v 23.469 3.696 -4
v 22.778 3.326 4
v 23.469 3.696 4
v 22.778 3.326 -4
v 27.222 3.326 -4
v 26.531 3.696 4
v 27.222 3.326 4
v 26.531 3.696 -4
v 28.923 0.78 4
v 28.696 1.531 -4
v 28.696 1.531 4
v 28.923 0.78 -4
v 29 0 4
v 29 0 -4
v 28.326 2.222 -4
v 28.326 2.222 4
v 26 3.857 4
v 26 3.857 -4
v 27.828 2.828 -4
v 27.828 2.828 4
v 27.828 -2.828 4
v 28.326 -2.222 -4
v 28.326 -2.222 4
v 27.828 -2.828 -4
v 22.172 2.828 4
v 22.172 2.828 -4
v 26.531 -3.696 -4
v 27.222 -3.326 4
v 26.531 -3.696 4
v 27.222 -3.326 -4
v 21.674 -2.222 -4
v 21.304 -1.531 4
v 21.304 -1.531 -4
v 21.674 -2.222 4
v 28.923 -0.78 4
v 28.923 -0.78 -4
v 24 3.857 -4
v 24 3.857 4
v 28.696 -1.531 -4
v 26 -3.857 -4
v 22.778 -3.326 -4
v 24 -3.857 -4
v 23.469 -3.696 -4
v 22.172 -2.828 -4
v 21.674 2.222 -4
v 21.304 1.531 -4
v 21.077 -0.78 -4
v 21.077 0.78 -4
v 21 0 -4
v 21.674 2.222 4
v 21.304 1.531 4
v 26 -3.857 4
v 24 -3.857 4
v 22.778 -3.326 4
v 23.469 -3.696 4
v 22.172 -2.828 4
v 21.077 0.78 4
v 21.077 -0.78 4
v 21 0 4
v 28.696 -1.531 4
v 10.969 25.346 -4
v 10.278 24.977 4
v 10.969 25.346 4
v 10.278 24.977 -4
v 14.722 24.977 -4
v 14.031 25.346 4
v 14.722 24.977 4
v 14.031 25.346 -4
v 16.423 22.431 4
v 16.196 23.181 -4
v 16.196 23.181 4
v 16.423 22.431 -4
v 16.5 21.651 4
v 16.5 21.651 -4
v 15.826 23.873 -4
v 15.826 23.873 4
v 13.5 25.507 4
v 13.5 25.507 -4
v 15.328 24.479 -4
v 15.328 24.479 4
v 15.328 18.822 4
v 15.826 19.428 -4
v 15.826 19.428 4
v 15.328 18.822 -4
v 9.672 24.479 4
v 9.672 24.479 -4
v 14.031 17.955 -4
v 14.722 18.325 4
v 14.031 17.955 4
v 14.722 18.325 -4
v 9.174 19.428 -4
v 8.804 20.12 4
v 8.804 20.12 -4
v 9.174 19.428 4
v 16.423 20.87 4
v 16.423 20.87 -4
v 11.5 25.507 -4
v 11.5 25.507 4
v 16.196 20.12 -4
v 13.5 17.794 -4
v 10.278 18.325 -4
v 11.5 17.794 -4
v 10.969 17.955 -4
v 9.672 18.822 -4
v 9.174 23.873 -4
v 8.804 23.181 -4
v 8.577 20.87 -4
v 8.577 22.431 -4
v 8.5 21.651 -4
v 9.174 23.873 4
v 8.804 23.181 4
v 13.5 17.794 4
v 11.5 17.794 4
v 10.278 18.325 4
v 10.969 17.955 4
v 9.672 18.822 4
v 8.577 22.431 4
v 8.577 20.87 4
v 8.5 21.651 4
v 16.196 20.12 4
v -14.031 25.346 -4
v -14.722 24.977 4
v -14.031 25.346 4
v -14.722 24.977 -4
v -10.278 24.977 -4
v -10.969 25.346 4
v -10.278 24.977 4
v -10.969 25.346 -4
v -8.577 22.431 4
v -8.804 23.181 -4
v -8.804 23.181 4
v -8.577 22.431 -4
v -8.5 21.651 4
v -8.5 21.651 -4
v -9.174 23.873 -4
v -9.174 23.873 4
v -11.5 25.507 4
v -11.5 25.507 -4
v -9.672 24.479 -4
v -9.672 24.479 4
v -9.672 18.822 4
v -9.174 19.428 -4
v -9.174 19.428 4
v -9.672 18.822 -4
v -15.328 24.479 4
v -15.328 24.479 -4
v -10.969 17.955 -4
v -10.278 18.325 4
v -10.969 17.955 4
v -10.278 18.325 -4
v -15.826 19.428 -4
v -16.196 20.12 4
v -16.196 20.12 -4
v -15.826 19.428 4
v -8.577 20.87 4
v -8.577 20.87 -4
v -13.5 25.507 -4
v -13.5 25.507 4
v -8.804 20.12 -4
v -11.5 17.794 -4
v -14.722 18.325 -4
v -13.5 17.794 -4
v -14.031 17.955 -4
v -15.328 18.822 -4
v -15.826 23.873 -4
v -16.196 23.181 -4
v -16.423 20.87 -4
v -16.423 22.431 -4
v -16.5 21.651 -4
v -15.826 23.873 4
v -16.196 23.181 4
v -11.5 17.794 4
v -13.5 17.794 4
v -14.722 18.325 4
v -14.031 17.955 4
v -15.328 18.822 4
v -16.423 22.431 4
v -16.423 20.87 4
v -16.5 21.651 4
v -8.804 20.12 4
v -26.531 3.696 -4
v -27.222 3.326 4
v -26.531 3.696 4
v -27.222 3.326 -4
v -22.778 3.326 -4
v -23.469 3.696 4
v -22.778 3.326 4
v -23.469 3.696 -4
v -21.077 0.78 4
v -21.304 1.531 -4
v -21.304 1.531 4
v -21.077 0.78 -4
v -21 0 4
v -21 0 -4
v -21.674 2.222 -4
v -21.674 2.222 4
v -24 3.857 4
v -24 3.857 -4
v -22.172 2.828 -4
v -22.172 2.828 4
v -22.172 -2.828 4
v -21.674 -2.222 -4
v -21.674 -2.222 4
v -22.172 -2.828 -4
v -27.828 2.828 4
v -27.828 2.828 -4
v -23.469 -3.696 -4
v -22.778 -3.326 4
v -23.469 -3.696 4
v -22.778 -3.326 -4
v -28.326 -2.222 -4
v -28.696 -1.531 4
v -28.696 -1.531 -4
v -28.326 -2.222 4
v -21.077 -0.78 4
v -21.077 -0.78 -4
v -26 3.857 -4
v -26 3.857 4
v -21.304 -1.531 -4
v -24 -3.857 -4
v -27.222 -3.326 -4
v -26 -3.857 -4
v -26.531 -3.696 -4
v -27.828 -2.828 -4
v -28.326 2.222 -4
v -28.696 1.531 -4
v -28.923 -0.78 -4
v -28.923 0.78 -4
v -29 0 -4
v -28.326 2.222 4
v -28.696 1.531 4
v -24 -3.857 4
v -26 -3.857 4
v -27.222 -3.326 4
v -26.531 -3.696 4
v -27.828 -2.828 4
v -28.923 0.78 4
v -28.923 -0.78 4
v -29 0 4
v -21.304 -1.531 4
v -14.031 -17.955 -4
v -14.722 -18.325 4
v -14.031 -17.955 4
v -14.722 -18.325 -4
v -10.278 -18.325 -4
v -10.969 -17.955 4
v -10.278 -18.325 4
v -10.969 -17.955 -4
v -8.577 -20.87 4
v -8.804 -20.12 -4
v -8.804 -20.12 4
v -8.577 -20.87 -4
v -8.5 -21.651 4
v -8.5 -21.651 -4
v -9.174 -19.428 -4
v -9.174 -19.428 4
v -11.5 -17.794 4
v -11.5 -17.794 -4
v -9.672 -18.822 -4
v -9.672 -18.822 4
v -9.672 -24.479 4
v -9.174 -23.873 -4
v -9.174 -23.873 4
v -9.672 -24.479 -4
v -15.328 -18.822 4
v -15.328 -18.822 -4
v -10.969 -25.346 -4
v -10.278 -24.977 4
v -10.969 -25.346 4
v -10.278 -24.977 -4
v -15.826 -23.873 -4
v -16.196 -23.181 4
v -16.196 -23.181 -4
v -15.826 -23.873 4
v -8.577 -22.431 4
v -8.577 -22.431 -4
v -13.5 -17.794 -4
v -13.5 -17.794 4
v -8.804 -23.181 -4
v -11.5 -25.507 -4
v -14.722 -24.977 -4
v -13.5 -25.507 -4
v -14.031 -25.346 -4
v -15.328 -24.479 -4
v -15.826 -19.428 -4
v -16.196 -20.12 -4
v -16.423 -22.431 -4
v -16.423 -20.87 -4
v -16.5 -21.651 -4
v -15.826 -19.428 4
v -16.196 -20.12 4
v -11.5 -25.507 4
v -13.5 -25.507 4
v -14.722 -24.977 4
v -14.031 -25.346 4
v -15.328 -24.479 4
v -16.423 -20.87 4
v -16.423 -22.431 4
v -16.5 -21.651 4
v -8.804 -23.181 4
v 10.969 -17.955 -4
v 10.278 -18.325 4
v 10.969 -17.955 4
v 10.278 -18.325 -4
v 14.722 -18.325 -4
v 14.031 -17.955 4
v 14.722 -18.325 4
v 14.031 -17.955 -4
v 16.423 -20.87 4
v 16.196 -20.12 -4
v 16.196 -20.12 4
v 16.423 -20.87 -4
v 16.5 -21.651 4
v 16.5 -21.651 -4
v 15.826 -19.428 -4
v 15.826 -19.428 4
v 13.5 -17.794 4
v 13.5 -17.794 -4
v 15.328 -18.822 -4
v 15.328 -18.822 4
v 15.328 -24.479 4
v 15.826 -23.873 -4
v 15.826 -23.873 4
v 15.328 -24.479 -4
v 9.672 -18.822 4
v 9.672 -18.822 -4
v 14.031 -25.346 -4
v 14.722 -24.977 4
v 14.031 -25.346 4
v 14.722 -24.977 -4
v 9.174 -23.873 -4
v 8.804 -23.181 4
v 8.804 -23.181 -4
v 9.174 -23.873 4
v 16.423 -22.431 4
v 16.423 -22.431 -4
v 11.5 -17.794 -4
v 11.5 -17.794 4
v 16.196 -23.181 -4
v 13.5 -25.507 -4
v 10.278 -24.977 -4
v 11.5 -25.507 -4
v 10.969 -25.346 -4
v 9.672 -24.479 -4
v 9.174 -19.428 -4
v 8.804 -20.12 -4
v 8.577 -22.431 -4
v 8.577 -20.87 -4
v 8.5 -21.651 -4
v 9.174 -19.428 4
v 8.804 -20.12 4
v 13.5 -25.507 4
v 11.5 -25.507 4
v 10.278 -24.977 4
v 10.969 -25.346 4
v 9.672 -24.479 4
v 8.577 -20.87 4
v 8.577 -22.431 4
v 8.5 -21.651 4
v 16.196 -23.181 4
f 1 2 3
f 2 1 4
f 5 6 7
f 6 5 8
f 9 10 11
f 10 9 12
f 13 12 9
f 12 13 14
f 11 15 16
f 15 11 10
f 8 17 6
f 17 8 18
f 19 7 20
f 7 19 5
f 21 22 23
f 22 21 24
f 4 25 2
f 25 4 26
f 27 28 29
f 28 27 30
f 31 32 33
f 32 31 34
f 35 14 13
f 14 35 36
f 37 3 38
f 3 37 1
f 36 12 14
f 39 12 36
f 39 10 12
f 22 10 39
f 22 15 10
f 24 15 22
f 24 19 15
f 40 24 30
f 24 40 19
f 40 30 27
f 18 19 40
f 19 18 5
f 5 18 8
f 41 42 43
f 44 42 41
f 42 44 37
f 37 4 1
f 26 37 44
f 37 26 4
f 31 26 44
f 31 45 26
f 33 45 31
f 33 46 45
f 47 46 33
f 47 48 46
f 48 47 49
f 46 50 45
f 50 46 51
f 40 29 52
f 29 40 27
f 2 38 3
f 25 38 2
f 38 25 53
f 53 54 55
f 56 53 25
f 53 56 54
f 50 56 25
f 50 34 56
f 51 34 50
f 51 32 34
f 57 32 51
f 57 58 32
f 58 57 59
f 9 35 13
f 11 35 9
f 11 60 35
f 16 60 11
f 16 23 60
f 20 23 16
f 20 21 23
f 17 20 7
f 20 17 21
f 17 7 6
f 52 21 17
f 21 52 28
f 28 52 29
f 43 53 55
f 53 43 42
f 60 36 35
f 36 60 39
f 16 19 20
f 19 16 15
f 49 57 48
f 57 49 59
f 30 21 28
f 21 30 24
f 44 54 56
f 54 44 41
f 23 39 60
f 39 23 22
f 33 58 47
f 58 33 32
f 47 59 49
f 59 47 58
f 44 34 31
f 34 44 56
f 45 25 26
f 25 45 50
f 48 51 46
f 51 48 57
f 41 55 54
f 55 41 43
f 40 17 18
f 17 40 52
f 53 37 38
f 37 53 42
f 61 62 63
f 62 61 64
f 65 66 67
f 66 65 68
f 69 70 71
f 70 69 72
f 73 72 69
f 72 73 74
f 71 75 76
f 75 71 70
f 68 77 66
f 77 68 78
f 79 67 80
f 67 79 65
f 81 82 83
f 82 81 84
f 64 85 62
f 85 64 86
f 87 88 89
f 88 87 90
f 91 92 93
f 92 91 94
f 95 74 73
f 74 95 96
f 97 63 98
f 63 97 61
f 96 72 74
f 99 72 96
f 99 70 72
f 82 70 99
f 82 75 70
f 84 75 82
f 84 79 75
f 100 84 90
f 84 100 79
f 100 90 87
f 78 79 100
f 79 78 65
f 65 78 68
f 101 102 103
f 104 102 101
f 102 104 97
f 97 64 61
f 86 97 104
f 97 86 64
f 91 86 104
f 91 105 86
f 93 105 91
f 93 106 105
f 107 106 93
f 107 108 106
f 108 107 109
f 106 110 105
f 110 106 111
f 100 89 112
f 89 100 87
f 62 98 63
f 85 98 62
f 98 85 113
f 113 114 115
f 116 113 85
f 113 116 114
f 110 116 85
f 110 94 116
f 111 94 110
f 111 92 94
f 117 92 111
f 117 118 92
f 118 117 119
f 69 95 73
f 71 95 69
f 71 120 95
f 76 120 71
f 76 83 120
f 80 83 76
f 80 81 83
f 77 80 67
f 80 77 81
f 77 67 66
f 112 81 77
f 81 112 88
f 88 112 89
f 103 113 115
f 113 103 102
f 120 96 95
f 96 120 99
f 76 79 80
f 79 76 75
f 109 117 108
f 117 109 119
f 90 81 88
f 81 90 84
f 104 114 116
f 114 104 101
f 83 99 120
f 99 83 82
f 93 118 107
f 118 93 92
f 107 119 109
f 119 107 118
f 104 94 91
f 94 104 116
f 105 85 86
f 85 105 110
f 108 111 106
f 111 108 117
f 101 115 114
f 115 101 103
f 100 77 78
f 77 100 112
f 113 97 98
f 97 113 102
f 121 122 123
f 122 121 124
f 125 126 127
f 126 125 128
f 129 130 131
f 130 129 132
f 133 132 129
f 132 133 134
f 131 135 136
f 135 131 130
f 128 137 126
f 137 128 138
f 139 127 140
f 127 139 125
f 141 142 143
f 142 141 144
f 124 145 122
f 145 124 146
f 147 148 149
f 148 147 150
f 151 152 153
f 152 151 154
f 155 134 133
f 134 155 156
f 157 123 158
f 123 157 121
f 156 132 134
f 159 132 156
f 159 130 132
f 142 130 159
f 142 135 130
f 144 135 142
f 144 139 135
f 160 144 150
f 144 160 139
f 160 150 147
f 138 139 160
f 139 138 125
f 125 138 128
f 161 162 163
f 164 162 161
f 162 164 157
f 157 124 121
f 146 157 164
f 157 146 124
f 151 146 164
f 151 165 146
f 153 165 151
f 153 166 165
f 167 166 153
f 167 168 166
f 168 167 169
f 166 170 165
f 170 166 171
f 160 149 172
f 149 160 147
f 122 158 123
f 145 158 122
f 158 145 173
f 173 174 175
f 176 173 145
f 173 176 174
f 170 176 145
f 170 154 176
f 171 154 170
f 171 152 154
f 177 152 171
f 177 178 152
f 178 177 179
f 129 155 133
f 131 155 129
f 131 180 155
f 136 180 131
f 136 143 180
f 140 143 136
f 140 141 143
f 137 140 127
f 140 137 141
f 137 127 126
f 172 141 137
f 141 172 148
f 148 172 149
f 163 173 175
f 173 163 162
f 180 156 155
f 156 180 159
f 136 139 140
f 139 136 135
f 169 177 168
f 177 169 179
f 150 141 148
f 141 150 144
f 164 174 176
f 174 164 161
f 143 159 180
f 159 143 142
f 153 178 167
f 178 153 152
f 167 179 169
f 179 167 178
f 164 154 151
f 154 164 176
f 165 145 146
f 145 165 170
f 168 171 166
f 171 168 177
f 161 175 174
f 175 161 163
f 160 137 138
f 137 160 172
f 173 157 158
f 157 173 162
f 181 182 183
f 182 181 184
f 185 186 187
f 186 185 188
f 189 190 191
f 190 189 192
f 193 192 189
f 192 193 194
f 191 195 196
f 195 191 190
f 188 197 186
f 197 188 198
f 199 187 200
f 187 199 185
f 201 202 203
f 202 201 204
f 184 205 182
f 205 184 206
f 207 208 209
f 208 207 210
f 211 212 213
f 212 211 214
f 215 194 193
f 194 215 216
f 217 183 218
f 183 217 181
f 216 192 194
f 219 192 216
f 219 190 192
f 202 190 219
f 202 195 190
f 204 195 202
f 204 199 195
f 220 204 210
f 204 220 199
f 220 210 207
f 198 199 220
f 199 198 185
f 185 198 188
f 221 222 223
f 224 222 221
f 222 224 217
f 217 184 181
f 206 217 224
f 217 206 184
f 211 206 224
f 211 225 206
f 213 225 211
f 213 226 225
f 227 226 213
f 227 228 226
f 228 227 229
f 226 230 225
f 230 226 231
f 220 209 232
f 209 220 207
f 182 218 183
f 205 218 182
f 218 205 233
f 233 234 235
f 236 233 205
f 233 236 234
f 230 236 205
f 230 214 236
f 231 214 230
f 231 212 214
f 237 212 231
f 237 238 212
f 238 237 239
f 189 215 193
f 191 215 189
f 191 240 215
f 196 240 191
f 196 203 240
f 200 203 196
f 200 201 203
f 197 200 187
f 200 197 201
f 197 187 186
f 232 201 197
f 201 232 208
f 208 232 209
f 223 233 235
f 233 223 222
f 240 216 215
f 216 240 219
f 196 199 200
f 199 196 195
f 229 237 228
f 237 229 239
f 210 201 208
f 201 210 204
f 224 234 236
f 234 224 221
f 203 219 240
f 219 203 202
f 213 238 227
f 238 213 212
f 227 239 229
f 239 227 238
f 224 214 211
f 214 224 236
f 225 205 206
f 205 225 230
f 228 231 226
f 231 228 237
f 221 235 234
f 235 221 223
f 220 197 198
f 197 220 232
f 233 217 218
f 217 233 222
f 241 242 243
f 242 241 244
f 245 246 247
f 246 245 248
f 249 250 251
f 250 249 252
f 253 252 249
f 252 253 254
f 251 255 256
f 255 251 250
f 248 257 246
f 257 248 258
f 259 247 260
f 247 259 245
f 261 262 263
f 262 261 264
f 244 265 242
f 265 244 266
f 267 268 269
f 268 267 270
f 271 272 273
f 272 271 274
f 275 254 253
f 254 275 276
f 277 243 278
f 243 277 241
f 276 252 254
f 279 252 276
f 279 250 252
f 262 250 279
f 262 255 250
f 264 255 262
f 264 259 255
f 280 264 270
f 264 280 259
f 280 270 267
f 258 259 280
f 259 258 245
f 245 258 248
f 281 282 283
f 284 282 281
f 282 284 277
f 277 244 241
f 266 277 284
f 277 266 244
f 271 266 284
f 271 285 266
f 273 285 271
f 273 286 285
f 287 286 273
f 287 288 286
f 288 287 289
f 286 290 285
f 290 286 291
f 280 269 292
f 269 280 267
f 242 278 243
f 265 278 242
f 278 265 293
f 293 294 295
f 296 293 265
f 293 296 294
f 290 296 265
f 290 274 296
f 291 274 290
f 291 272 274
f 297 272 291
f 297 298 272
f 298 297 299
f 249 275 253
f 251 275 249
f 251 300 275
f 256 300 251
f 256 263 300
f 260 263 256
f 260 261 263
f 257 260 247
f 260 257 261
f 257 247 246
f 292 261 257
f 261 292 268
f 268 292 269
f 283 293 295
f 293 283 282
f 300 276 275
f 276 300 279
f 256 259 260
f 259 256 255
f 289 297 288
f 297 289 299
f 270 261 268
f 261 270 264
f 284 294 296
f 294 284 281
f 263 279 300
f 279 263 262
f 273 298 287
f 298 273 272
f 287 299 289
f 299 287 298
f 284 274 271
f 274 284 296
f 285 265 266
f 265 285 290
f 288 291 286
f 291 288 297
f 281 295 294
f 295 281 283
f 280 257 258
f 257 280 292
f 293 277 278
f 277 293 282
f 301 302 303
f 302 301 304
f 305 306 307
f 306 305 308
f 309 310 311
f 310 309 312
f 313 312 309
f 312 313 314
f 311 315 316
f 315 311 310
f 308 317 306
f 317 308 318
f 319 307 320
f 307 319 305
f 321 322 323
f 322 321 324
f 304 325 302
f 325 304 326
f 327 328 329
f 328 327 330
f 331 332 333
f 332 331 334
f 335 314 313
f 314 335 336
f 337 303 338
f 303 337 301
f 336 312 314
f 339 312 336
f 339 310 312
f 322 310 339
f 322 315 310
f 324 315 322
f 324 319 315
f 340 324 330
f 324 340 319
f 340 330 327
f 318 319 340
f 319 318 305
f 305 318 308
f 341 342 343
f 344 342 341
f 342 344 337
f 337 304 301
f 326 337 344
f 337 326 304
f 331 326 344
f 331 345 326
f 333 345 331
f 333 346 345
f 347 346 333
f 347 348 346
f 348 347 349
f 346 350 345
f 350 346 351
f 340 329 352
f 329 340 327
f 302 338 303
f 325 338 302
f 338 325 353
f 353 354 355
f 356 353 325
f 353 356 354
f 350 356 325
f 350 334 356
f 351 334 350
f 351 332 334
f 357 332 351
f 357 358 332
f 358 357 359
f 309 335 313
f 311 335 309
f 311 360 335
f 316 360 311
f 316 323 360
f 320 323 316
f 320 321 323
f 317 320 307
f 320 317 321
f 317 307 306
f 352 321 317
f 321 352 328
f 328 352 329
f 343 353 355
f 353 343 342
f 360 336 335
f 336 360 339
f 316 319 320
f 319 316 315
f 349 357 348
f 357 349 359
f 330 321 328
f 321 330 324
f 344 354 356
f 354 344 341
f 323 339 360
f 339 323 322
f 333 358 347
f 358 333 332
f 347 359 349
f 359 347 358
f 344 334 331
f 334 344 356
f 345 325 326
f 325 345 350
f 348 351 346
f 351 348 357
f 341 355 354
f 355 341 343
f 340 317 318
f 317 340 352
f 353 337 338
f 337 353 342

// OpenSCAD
// TEST 14: Nested module calls and complex expressions
// Tests: sin/cos in translate, nested calls, convexity= ignored.
// Expected: ring of 6 teeth, each a difference of cylinder minus slot.

$fn = 32;

teeth   = 6;
ring_r  = 25;
tooth_r = 4;
tooth_h = 8;
slot_w  = 2;

module tooth(r=4, h=8) {
    difference() {
        cylinder(h=h, r=r, center=true);
        cube([slot_w, r*2+1, h+1], center=true);
    }
}

for (i = [0:teeth-1]) {
    translate([cos(i*360/teeth)*ring_r,
               sin(i*360/teeth)*ring_r,
               0]) {
        tooth(r=tooth_r, h=tooth_h);
    }
}
